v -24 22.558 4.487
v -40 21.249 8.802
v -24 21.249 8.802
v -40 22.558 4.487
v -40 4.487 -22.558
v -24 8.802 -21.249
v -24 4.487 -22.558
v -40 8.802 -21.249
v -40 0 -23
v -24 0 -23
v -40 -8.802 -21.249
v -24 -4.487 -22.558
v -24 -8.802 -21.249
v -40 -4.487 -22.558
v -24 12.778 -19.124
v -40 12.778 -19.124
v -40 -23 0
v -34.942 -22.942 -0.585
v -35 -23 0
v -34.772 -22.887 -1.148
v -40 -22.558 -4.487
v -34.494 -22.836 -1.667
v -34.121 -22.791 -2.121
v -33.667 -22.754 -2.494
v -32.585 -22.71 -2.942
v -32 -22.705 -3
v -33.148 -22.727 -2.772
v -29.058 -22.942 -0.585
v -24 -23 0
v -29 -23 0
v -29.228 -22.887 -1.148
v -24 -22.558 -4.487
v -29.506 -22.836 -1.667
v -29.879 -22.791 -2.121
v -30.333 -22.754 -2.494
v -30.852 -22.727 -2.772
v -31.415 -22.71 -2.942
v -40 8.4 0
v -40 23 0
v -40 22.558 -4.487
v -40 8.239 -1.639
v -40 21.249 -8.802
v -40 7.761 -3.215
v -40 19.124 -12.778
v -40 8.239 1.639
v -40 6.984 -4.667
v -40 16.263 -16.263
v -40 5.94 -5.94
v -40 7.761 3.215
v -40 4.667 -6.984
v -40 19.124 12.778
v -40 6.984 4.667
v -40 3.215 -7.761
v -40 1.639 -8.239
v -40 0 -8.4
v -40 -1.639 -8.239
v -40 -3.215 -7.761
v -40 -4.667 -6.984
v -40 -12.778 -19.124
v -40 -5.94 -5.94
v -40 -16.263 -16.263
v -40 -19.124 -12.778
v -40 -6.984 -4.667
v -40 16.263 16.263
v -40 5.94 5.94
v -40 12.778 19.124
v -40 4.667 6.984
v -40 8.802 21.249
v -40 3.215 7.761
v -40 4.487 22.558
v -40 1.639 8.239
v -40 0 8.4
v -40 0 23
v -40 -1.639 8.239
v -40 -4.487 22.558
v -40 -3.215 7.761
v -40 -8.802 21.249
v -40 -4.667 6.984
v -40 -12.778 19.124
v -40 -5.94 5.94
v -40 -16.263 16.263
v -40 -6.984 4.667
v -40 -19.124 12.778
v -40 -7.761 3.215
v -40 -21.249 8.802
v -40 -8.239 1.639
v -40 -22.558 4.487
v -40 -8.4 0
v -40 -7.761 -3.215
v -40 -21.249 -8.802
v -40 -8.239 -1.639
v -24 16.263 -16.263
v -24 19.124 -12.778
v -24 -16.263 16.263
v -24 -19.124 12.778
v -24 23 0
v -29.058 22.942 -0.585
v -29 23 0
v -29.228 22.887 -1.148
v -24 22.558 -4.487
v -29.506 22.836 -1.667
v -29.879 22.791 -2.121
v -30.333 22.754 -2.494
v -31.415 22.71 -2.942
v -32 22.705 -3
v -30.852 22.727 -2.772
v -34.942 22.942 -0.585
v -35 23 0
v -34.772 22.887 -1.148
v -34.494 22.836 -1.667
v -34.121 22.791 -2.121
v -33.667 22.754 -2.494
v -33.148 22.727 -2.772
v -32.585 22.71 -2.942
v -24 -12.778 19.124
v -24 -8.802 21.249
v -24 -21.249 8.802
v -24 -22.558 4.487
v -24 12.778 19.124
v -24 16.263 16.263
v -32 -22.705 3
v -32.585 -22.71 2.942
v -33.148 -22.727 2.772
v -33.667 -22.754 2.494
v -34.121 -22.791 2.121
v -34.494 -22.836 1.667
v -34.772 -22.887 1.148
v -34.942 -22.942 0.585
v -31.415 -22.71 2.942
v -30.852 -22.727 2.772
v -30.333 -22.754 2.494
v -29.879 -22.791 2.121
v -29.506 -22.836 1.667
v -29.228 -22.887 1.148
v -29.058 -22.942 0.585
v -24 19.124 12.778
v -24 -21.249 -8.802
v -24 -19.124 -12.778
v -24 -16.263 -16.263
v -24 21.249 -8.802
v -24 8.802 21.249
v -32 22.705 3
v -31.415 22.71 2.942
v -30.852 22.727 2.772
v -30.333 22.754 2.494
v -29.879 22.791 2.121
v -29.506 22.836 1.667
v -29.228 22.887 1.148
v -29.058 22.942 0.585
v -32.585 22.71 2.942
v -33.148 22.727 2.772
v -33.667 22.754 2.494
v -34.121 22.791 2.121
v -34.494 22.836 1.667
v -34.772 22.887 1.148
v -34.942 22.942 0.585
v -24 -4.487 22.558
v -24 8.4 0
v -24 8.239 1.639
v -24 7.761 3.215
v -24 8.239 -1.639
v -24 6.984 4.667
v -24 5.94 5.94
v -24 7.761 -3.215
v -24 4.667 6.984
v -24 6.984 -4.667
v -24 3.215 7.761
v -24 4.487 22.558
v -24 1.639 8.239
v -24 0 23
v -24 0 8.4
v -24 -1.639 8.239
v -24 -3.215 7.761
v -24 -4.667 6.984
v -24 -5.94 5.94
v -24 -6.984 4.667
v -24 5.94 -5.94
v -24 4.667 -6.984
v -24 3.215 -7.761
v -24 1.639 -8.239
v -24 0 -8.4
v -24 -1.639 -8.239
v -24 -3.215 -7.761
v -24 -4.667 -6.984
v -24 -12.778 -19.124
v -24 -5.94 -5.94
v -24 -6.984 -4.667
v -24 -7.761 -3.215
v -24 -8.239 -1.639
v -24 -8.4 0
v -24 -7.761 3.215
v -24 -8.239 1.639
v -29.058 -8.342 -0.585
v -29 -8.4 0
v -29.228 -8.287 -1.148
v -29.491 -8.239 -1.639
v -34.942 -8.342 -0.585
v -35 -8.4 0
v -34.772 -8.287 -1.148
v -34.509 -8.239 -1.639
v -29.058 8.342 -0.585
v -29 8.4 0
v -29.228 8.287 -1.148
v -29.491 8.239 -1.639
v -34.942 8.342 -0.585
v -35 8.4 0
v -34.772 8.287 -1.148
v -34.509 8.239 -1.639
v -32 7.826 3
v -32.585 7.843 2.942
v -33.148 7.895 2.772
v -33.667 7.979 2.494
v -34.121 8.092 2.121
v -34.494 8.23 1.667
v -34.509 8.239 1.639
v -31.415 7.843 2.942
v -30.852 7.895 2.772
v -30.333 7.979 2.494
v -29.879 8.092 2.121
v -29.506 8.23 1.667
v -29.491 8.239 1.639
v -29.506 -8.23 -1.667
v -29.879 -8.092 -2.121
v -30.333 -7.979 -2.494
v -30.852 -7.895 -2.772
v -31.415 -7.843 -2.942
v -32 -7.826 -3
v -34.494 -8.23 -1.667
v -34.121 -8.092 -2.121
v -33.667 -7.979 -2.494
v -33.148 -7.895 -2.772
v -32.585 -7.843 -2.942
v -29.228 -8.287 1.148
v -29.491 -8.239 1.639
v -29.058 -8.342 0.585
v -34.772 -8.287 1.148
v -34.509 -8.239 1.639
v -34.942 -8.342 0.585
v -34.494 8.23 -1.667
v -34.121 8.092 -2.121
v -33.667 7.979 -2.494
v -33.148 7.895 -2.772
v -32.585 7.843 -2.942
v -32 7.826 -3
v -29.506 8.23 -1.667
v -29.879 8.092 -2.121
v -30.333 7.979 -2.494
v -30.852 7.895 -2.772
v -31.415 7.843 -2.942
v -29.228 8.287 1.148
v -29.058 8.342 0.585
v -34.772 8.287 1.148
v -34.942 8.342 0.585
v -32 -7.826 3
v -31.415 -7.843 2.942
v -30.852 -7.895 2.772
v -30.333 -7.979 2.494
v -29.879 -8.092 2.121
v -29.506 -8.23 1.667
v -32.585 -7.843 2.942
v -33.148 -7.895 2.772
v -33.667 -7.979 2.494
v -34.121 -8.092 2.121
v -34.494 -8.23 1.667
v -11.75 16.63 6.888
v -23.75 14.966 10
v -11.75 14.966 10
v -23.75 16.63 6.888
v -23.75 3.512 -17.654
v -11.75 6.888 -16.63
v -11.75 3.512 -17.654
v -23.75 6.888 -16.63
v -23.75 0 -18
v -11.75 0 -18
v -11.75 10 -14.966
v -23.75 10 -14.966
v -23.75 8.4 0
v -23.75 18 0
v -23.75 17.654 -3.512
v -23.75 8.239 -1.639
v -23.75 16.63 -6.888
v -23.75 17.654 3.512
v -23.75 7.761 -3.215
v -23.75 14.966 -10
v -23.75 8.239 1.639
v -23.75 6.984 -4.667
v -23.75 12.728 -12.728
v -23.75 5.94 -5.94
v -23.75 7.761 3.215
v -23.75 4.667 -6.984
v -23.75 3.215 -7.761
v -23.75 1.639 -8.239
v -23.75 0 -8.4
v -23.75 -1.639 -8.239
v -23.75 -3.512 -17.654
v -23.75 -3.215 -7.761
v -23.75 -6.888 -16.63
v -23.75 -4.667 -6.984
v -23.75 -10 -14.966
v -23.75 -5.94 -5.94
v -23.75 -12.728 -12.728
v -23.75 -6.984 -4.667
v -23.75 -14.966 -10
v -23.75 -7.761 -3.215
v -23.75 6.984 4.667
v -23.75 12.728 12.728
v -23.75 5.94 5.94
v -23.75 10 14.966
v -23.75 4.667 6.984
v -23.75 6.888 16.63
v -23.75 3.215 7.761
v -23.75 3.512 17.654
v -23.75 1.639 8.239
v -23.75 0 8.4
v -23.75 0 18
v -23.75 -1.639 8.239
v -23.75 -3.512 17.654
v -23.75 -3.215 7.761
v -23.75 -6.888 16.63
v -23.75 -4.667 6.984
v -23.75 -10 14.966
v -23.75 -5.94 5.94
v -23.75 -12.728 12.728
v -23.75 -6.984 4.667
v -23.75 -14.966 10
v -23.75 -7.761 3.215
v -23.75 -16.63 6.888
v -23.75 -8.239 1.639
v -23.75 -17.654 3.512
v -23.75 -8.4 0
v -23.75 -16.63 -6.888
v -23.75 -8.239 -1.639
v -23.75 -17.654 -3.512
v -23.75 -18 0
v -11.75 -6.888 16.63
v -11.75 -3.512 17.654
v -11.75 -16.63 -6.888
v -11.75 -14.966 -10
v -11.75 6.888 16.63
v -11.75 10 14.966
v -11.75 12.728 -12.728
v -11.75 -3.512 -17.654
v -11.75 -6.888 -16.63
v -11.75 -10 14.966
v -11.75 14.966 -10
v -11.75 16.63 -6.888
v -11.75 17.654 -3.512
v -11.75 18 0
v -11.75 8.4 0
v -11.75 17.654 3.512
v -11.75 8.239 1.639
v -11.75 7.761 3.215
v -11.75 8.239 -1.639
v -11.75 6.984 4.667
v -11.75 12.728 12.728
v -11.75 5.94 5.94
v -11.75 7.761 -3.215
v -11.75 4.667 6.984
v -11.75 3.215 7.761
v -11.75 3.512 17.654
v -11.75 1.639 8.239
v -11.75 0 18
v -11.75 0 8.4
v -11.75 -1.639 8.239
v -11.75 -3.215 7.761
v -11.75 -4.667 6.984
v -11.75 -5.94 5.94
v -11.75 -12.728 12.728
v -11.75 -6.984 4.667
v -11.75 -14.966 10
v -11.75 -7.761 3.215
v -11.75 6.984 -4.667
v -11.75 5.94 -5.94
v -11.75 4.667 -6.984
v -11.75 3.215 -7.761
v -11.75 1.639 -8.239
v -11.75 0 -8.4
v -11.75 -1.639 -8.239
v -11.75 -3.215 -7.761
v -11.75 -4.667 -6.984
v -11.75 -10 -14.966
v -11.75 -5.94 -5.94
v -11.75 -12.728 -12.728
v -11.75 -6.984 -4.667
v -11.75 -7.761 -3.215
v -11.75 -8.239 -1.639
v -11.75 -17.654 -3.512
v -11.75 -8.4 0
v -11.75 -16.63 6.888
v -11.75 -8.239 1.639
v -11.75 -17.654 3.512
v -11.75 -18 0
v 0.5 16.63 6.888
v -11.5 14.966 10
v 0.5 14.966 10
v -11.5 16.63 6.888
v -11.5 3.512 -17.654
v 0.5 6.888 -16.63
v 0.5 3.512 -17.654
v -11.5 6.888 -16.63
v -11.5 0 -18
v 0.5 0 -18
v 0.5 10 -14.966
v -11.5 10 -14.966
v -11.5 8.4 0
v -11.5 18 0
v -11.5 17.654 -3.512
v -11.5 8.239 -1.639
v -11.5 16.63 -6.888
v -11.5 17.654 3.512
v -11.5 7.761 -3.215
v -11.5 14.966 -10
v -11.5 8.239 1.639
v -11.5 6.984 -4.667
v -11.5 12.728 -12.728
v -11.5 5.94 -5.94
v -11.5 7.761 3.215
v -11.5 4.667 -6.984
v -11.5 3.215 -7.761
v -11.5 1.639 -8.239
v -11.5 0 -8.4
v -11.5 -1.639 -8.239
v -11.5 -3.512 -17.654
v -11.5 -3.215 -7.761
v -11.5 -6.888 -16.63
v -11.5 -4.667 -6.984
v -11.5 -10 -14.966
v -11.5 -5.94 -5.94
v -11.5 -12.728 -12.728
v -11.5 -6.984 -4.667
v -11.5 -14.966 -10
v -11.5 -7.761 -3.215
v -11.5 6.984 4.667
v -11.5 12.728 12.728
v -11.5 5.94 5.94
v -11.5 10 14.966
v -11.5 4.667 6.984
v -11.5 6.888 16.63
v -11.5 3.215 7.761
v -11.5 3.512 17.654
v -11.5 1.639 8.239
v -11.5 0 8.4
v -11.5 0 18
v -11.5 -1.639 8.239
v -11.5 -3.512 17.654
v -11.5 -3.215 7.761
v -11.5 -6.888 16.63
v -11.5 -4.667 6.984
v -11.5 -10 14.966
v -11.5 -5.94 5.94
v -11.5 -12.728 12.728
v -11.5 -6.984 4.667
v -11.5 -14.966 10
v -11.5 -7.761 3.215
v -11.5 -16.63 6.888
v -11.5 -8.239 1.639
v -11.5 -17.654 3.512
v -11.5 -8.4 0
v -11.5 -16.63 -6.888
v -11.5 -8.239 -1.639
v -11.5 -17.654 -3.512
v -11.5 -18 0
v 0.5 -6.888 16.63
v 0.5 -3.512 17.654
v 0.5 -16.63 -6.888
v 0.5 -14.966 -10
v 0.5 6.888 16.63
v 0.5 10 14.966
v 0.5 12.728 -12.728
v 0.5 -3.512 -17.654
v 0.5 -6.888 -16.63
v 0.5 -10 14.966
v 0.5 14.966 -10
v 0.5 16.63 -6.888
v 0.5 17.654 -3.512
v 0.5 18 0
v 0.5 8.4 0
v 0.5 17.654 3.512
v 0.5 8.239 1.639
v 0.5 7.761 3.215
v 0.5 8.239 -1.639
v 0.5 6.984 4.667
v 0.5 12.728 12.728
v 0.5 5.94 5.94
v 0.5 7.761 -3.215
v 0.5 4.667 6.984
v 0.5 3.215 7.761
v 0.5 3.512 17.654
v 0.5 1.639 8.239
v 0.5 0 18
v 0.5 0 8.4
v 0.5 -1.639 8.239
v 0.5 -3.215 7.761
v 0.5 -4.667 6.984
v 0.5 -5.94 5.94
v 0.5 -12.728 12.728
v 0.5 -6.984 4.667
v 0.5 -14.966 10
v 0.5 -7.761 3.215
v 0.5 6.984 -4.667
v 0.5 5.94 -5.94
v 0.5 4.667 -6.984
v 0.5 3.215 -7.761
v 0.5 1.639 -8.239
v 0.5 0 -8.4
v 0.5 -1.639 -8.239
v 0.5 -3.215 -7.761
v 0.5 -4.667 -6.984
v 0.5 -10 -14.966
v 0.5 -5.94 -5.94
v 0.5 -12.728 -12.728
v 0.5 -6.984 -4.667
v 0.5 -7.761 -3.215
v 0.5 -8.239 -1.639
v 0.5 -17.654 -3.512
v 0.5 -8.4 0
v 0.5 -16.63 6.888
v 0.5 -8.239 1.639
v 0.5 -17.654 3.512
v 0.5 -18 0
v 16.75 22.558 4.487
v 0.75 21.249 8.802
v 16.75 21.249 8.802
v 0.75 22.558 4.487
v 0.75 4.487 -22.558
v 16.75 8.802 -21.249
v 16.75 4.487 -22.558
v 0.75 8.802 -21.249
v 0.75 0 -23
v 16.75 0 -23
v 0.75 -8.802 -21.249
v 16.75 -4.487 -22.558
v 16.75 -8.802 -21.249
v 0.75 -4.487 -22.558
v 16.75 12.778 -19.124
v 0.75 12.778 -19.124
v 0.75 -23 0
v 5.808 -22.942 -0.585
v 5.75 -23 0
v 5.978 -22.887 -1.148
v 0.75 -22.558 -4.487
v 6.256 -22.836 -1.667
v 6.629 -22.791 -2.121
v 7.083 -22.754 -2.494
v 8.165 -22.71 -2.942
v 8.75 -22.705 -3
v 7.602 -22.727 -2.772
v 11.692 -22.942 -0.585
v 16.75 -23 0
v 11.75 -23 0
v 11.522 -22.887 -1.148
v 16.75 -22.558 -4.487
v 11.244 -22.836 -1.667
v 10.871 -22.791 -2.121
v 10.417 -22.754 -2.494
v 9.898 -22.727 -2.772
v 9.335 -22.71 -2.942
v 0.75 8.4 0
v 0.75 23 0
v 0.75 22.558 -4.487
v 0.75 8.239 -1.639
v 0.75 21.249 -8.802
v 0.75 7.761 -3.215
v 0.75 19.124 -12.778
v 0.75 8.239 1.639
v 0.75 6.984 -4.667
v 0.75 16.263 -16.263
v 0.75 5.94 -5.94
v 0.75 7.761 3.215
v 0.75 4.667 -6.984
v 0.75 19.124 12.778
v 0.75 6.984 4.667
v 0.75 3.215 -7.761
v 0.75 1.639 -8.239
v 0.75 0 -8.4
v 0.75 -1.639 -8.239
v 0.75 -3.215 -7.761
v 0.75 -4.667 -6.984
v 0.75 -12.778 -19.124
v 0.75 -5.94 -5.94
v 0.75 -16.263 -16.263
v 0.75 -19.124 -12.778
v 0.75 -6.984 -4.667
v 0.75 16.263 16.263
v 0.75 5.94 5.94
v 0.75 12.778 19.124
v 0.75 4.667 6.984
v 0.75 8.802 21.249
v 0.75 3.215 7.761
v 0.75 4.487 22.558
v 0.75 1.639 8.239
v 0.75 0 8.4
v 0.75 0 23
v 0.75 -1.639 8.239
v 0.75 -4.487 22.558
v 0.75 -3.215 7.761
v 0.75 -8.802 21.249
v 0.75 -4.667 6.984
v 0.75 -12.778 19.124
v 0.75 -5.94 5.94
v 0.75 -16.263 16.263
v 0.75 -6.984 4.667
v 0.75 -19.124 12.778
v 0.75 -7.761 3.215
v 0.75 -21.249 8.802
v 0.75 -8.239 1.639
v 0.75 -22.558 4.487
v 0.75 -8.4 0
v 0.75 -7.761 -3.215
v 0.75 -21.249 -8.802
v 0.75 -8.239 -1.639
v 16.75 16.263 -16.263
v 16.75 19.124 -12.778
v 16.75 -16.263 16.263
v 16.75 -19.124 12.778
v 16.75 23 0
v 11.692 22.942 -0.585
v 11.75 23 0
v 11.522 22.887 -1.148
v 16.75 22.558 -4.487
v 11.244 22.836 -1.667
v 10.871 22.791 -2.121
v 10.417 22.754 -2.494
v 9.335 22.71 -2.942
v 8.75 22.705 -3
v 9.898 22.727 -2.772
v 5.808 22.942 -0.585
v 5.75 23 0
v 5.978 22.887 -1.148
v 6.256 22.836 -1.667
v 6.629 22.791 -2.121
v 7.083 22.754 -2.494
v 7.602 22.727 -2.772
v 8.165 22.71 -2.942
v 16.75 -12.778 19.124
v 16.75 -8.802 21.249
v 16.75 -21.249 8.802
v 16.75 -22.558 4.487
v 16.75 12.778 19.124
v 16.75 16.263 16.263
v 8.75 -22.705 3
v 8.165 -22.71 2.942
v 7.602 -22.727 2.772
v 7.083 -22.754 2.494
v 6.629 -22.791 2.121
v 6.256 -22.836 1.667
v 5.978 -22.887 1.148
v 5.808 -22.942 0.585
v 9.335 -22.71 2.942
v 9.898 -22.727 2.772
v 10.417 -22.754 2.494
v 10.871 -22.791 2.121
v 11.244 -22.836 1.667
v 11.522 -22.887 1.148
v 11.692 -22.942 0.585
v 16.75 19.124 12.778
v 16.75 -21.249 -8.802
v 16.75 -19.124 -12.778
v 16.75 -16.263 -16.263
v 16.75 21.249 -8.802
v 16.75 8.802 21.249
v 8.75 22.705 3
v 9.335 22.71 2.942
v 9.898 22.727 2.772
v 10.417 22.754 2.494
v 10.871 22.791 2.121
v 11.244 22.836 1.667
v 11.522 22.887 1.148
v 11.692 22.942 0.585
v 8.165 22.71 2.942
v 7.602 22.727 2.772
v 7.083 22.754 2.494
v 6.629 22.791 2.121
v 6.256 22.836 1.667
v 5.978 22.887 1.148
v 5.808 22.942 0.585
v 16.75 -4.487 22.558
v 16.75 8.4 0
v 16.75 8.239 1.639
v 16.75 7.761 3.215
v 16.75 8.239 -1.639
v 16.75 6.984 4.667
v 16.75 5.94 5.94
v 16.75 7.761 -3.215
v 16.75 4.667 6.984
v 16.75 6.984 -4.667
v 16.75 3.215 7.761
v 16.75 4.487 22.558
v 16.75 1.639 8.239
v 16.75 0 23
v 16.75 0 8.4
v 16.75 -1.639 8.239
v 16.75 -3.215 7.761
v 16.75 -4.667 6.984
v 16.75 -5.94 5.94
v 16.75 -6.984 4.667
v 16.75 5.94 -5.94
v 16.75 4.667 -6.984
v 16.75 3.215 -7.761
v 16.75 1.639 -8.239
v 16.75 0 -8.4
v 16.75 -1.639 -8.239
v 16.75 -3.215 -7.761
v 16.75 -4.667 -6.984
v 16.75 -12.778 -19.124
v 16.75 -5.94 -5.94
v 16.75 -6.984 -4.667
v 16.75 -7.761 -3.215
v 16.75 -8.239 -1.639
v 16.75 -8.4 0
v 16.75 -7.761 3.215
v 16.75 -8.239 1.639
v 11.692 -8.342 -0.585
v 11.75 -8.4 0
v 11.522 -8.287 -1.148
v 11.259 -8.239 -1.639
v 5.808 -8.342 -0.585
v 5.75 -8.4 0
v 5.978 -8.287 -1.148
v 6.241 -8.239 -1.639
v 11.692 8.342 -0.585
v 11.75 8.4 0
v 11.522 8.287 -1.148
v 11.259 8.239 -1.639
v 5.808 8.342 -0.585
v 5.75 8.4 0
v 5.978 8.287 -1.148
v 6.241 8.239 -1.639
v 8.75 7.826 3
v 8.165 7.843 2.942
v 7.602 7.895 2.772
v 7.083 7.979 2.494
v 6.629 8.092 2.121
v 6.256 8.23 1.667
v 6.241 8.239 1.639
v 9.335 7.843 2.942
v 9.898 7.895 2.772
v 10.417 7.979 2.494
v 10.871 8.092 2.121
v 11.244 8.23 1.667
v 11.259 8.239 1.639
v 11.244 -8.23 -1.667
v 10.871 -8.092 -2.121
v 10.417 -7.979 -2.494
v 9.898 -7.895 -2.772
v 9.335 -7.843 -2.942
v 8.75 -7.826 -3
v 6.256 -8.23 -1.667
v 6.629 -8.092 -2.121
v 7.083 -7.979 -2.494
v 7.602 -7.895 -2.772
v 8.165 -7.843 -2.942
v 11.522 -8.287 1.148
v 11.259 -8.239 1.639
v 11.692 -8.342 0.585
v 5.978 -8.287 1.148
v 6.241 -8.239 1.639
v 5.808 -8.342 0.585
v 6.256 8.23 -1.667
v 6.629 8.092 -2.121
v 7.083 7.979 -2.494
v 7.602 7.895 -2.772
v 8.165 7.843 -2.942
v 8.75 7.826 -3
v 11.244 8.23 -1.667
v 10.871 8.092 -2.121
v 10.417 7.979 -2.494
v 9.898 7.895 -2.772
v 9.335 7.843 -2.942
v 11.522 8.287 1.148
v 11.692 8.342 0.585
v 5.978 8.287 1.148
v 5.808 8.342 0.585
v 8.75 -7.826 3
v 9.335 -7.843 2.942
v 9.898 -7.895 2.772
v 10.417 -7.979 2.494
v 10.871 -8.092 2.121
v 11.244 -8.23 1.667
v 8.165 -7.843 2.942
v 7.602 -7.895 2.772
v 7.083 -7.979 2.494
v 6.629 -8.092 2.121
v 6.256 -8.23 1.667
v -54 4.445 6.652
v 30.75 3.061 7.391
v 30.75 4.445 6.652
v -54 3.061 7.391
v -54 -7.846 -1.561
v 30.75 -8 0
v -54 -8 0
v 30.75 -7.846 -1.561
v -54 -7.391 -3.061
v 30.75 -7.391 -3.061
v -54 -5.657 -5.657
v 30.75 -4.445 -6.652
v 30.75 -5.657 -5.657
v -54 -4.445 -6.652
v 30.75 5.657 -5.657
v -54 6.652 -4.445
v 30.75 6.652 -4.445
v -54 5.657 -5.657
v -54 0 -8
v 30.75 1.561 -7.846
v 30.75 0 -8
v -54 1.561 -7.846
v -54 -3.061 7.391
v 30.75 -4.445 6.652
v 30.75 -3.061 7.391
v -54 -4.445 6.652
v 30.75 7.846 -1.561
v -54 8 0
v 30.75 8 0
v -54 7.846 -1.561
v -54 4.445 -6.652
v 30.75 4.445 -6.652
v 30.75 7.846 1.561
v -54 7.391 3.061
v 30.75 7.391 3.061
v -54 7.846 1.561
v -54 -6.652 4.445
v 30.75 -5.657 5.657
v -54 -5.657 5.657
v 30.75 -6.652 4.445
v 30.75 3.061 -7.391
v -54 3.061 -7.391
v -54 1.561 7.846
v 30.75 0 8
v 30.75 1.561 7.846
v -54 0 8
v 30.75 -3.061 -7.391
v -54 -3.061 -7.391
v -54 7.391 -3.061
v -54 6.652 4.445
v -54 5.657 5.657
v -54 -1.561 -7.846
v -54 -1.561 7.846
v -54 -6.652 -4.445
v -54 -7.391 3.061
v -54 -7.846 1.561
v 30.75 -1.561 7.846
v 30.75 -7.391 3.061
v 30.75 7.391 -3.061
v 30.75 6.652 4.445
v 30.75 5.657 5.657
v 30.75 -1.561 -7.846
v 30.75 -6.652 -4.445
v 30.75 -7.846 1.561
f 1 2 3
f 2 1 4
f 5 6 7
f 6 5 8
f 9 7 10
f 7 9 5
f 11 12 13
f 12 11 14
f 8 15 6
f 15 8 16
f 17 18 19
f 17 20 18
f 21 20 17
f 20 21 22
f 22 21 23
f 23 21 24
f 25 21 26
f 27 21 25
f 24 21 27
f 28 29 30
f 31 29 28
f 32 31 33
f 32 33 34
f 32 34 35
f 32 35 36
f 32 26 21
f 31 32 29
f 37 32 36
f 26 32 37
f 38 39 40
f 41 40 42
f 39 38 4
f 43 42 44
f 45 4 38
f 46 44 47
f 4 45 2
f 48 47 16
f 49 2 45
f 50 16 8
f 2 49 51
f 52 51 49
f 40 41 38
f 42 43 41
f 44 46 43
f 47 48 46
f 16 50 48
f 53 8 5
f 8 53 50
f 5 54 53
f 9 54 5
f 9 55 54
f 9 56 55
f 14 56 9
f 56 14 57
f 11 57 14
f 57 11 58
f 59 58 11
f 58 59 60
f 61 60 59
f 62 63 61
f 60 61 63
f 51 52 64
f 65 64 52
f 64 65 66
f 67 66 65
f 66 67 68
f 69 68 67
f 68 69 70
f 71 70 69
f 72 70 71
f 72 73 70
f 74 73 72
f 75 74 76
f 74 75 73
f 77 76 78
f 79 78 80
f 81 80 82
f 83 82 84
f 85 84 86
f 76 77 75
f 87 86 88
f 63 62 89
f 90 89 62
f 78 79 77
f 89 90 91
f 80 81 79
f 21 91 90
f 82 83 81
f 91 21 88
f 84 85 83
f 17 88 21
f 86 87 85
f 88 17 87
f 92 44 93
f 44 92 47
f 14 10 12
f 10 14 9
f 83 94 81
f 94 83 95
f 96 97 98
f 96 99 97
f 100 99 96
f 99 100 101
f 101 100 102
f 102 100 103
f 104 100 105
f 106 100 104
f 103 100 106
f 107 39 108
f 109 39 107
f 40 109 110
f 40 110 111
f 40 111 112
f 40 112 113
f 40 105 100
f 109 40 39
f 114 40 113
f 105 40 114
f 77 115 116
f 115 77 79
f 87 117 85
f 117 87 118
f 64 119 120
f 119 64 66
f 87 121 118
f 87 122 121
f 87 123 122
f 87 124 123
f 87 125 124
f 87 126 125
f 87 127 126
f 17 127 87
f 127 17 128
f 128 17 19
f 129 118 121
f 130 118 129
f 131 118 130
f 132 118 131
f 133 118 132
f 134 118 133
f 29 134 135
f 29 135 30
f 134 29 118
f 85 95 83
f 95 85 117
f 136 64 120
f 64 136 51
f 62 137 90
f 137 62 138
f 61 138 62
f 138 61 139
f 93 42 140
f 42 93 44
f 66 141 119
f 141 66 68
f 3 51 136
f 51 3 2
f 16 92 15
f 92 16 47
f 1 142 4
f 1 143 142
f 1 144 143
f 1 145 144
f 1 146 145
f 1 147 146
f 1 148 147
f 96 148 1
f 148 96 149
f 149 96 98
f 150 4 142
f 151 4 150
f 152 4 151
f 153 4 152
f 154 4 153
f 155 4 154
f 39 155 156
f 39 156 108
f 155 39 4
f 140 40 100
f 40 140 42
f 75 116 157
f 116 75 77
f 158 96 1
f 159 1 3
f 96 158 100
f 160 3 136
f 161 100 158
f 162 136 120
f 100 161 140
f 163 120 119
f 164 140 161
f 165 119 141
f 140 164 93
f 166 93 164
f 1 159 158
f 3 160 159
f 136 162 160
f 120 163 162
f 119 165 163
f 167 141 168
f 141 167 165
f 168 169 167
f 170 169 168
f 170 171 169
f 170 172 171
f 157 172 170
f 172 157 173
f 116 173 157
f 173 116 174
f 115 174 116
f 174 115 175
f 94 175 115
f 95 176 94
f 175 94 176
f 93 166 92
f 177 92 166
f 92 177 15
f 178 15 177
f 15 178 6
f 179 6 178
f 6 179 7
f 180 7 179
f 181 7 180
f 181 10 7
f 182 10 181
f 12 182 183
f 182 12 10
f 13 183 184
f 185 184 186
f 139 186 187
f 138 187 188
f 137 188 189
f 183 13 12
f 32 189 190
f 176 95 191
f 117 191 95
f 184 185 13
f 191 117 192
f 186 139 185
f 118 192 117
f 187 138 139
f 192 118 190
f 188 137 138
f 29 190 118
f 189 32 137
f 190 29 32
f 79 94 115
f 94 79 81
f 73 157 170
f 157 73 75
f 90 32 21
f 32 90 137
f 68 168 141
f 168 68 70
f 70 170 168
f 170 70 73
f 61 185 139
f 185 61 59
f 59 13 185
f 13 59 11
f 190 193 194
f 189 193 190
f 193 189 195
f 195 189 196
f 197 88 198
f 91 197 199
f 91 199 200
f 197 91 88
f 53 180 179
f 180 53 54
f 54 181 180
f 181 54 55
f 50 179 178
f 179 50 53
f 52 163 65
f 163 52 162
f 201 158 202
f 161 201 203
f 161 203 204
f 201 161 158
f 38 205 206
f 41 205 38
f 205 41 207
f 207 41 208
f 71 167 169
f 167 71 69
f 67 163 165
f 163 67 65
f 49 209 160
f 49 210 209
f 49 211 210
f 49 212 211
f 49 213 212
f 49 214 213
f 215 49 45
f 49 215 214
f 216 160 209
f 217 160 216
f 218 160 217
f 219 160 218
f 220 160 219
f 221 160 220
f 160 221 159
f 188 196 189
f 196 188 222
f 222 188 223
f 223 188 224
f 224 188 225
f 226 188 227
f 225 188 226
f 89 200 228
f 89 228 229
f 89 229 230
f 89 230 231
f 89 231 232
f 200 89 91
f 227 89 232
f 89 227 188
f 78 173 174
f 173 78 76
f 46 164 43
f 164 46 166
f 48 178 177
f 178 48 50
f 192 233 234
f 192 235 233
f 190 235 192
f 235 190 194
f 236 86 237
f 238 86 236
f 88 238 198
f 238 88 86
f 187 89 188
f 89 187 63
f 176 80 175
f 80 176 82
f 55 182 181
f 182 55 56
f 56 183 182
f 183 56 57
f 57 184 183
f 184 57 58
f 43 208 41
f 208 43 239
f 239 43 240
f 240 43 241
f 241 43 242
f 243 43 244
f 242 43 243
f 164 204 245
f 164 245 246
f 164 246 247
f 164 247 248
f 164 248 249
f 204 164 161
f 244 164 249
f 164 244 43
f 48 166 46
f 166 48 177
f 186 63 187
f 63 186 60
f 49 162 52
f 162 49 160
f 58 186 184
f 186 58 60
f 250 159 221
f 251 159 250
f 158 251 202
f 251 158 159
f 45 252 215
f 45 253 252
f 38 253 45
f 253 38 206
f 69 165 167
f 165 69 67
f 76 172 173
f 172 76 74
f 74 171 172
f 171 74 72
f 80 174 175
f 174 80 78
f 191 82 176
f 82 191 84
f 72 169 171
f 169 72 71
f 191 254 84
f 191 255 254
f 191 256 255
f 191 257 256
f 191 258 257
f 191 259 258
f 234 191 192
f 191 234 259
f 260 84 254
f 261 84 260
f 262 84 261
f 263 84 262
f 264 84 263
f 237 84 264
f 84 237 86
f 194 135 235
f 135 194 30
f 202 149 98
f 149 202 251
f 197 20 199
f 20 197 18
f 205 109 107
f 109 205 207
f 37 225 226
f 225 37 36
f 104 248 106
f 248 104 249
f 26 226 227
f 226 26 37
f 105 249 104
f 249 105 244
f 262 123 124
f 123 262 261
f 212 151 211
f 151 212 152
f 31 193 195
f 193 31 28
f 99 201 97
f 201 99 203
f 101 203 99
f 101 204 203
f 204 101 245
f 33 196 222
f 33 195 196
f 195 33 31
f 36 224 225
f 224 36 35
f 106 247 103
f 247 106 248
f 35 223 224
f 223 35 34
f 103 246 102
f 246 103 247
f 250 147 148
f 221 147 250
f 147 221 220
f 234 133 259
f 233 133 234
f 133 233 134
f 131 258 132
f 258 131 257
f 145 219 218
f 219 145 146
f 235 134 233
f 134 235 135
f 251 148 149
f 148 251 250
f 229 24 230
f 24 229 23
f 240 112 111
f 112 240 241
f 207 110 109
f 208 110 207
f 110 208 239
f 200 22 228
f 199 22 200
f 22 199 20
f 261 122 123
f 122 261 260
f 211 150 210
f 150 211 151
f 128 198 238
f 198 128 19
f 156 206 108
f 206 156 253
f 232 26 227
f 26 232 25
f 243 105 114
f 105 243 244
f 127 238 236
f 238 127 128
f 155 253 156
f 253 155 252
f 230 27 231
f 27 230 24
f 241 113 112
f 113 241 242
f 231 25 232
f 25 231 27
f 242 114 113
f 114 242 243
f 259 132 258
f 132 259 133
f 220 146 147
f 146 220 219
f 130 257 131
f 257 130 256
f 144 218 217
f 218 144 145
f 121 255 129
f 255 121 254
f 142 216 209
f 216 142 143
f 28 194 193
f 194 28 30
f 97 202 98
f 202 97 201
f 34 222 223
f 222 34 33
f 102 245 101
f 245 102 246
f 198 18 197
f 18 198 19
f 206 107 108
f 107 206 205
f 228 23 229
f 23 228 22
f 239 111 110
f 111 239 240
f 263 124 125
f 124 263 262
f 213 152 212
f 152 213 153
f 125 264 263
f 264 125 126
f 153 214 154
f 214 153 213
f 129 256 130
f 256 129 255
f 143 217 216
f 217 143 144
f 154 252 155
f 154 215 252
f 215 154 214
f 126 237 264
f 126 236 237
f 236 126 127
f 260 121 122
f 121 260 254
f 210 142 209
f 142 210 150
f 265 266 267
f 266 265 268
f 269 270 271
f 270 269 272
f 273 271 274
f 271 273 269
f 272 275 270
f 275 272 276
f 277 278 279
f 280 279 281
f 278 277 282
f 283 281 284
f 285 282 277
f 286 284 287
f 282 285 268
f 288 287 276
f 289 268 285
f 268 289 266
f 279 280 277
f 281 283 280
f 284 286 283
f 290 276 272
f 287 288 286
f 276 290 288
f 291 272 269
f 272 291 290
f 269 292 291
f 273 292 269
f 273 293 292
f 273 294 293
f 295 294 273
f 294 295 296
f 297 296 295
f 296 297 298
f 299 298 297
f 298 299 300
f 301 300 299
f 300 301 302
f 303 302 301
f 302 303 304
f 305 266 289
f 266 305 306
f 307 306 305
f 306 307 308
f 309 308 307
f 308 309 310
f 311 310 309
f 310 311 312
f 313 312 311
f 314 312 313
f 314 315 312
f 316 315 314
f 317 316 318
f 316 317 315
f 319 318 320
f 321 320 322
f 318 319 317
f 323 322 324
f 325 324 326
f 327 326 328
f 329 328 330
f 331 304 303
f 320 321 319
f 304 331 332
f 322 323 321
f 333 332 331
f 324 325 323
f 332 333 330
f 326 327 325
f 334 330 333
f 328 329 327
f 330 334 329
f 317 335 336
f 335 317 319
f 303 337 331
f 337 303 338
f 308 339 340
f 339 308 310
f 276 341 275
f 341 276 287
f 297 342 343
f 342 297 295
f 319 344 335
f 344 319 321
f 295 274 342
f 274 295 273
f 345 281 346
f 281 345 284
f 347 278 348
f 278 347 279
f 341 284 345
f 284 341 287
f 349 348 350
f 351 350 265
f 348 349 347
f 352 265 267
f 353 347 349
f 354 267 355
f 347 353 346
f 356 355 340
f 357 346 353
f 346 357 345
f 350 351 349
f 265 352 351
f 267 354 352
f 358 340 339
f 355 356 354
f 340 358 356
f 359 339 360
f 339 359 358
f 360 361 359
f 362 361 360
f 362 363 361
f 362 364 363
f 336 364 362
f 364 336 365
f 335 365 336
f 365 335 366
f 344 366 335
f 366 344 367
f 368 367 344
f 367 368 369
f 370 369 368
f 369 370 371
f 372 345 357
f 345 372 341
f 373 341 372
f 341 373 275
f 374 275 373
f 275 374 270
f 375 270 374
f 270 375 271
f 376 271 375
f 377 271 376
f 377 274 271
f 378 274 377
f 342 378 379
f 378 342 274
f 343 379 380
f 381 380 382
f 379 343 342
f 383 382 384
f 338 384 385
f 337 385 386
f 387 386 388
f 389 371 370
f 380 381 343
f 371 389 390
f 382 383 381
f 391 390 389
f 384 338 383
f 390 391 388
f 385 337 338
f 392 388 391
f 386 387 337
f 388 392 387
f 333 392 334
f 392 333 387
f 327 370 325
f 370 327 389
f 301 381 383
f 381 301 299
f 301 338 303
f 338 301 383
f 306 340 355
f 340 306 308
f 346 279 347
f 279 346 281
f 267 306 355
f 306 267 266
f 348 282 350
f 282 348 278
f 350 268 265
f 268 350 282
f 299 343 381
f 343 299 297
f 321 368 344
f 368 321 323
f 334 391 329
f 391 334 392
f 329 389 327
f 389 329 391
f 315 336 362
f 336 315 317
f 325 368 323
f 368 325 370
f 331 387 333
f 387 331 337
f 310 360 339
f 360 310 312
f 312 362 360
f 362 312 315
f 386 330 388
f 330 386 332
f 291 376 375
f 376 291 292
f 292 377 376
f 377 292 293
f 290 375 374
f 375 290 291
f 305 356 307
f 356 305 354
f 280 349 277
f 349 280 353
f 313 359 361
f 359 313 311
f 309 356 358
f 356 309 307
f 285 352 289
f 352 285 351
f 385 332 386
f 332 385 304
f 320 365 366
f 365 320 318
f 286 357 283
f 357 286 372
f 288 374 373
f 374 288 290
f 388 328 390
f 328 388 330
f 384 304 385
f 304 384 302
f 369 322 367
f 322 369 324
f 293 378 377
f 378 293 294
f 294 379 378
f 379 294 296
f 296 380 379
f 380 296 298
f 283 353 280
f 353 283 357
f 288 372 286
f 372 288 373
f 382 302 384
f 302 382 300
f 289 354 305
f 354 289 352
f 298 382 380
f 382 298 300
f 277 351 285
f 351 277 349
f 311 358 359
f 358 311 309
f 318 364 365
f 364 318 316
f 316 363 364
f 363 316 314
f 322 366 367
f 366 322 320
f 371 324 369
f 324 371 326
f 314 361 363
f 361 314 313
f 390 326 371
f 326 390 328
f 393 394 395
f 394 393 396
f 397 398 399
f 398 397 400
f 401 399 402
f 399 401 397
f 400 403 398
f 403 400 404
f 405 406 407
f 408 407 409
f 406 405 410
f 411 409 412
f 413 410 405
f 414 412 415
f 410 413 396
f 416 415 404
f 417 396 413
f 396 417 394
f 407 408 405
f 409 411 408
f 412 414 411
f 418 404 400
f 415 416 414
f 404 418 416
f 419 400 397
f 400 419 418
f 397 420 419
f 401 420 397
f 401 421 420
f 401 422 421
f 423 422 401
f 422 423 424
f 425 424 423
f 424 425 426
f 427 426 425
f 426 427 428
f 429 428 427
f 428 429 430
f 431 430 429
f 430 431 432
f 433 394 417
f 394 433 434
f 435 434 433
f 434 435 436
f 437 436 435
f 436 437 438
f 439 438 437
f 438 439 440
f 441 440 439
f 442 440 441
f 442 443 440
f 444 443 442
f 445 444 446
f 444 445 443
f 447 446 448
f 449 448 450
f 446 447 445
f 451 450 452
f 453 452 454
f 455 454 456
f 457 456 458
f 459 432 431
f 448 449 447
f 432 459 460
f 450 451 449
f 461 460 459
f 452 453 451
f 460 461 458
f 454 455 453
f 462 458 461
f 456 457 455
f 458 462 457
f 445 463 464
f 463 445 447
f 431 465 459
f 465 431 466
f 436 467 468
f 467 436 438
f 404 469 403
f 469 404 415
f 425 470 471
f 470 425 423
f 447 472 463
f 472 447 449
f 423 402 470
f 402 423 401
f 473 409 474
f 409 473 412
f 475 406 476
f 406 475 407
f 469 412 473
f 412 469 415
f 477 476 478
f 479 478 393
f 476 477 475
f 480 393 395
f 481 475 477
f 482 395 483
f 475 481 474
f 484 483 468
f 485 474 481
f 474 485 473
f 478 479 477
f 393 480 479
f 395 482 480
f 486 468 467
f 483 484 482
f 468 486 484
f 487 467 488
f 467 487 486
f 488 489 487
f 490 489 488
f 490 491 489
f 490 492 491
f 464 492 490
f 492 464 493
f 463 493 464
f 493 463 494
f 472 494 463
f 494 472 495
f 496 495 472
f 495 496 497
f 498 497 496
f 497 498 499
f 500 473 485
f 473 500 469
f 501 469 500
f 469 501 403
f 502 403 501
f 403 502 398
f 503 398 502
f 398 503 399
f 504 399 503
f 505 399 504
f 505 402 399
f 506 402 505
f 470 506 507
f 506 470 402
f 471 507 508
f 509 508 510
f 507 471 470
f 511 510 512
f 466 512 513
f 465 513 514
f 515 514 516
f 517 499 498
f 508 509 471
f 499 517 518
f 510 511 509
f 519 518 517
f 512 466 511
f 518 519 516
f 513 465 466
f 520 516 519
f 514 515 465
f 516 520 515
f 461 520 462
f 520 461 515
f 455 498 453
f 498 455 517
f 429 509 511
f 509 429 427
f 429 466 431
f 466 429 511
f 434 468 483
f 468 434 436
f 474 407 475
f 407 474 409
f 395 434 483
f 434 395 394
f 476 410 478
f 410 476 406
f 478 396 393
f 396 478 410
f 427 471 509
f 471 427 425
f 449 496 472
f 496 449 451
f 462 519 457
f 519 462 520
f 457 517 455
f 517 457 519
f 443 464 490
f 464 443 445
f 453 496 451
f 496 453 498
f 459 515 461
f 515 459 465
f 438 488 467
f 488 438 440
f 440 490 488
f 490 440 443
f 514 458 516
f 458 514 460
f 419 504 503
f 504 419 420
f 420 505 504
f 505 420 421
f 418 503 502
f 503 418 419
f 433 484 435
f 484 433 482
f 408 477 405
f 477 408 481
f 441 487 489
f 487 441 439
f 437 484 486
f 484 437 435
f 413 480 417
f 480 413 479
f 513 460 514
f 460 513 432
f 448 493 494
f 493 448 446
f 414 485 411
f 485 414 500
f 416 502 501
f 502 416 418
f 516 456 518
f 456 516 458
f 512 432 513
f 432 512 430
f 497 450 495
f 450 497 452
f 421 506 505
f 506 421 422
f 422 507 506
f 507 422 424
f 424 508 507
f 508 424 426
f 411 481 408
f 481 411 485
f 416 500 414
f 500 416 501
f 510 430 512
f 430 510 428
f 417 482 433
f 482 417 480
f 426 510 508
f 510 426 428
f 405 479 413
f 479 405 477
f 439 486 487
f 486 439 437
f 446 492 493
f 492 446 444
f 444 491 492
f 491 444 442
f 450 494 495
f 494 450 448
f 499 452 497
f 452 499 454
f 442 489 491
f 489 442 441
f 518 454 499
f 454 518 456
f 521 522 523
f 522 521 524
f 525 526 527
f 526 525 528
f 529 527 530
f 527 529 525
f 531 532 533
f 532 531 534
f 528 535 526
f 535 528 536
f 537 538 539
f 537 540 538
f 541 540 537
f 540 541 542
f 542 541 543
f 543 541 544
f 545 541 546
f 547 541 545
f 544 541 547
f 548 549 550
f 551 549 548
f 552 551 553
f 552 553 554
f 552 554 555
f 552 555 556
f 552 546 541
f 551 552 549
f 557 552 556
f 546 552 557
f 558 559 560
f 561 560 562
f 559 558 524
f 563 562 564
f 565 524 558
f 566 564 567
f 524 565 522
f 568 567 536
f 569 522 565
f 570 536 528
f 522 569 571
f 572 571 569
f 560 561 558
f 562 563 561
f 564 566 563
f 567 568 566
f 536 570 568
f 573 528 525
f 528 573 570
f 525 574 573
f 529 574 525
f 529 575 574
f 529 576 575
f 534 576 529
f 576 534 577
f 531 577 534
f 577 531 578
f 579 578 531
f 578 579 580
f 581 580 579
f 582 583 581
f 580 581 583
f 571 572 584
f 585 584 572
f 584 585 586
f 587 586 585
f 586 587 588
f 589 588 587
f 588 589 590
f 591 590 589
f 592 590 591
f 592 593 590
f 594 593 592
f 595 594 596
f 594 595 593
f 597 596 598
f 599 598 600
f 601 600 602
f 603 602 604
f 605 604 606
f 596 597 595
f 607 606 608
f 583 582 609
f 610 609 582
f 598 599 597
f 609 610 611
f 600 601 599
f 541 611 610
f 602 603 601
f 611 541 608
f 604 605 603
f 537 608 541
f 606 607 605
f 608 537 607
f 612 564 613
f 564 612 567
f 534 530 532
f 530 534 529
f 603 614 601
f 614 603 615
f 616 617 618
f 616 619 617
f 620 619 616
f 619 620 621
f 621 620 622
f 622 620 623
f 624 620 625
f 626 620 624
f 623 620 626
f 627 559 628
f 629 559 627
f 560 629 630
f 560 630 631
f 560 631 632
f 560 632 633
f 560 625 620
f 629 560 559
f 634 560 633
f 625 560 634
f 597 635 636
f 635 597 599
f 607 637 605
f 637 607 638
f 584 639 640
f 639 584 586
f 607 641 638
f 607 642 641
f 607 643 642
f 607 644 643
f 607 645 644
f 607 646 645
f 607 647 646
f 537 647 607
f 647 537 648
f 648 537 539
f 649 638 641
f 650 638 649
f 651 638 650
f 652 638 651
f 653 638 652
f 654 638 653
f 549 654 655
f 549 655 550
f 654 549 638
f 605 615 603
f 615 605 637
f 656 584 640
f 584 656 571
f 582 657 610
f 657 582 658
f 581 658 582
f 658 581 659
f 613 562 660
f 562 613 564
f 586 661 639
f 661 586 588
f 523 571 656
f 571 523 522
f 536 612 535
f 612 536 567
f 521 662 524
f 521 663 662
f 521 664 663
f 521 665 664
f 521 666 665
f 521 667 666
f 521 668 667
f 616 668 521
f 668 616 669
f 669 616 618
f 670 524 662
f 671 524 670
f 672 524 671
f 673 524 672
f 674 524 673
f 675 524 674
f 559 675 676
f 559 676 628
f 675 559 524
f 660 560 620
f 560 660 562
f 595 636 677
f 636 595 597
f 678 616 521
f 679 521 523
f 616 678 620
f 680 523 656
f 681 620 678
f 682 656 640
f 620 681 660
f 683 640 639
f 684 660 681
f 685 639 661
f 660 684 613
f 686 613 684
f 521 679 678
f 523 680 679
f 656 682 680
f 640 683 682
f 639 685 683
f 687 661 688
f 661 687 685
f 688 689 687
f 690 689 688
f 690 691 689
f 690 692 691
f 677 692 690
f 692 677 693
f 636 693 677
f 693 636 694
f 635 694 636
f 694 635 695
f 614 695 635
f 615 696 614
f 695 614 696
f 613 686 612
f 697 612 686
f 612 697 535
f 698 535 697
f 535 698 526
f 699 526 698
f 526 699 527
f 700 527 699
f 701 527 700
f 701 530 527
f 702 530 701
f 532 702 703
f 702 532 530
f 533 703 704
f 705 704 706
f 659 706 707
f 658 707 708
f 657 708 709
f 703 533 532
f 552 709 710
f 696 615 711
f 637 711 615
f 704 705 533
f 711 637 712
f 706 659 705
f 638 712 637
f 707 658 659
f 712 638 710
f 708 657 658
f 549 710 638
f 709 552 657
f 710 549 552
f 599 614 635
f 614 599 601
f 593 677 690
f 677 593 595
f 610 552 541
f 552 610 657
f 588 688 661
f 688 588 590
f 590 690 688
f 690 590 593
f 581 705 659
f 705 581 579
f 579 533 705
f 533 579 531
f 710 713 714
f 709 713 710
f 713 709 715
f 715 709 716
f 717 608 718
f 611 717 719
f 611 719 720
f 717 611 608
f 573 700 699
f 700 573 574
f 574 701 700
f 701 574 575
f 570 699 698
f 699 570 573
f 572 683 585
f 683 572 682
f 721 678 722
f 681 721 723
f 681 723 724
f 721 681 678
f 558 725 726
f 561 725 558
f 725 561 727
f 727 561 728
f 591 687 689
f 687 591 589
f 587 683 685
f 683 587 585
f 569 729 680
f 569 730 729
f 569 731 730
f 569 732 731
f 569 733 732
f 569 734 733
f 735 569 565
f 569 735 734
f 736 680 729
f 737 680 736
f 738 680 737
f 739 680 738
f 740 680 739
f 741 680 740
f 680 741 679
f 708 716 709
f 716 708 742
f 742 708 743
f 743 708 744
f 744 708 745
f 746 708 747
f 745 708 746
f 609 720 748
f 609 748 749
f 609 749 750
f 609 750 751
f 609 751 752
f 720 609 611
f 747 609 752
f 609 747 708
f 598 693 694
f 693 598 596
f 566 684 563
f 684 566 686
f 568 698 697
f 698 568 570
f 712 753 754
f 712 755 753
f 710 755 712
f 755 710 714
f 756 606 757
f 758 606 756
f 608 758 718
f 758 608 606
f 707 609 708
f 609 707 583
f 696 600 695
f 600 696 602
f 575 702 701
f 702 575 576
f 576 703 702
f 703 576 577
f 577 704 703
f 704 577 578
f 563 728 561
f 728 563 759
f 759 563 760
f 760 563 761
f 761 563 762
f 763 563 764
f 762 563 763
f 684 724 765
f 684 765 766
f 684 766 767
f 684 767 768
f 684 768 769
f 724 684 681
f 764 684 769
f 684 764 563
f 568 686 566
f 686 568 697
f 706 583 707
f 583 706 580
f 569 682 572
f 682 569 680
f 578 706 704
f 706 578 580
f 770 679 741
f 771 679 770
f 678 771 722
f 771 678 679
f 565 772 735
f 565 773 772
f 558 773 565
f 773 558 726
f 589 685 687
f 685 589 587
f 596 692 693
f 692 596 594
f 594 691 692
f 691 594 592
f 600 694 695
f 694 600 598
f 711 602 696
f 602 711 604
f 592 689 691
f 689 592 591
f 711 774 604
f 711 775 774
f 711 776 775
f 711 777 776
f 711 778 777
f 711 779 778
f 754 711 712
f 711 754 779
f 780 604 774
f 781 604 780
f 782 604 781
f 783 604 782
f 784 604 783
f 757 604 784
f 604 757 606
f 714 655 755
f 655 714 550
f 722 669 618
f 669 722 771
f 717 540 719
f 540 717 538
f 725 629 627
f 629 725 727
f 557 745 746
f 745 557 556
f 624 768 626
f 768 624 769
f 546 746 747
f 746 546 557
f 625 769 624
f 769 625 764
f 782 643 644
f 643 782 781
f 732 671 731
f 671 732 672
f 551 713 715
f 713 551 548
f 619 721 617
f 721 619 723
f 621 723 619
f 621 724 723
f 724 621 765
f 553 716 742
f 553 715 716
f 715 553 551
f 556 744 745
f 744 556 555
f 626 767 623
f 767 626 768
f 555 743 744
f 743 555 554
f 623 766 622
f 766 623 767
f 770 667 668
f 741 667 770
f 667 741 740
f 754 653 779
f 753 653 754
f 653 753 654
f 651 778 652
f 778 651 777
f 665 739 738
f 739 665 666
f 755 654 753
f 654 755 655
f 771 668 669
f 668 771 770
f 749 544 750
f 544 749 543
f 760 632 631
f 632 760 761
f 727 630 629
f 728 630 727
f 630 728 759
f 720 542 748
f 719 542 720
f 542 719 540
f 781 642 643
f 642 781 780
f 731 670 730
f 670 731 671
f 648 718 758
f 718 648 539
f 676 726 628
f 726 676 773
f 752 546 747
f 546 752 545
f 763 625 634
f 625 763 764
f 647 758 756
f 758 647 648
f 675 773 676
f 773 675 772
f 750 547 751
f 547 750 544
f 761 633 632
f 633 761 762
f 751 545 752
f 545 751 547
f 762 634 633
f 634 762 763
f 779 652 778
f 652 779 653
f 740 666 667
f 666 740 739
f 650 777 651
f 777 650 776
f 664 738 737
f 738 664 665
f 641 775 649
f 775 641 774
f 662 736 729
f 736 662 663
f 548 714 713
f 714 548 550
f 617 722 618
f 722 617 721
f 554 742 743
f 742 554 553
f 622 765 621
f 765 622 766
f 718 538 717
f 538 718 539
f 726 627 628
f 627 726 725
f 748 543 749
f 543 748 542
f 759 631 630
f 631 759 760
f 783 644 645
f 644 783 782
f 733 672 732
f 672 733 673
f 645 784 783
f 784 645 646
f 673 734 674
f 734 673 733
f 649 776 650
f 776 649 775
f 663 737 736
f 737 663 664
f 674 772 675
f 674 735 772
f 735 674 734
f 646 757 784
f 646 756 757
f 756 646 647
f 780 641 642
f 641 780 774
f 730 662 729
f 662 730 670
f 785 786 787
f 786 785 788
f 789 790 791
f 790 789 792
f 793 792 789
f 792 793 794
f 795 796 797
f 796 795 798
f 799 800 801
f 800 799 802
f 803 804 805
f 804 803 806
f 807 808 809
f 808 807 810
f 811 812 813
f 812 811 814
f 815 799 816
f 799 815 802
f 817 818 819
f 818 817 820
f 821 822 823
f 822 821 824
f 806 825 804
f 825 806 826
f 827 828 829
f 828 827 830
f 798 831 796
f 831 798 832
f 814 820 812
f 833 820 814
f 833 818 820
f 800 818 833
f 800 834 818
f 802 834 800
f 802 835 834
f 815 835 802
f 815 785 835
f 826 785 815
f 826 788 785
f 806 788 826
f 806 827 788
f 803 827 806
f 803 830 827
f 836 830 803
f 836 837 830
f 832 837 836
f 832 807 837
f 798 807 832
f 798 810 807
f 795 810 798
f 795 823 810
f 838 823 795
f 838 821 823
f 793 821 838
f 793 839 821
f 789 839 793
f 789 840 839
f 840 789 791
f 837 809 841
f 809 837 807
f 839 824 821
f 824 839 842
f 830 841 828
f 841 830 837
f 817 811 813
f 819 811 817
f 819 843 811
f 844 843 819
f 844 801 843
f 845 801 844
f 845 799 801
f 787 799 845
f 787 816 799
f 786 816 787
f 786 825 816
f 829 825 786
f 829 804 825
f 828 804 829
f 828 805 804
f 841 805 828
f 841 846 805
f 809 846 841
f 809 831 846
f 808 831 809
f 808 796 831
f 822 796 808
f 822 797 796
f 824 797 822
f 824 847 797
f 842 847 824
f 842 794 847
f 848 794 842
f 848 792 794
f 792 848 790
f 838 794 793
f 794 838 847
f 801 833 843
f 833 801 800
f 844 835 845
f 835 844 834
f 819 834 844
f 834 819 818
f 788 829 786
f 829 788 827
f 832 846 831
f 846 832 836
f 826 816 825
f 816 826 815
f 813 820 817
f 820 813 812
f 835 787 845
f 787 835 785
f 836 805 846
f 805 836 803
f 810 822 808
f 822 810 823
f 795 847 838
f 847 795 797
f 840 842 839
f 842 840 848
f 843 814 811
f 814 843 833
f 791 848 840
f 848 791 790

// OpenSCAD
$fn = 32;

// ------------------------------------------------------------------------
// Shaft with rings and collars: d16 shaft, 4 rings
// Every part is its own module, assembly() places them once.
// ------------------------------------------------------------------------

// --- part 1 ---
module shaft() {
  translate([0, 0, -42.375]) cylinder(h = 84.75, d = 16);
}

// --- part 2 ---
module collar_a() {
  difference() {
    cylinder(h = 16, d = 46);
    translate([0, 0, -1]) cylinder(h = 18, d = 16.8);
    translate([0, 0, 8]) rotate([90, 0, 0]) cylinder(h = 48, d = 6, center = true);
  }
}

// --- part 3 ---
module spacer_a() {
  difference() {
      translate([0, 0, 0]) cylinder(h = 12, d = 36);
      translate([0, 0, -1]) cylinder(h = 14, d = 16.8);
    }
}

// --- part 4 ---
module spacer_b() {
  difference() {
      translate([0, 0, 0]) cylinder(h = 12, d = 36);
      translate([0, 0, -1]) cylinder(h = 14, d = 16.8);
    }
}

// --- part 5 ---
module collar_b() {
  difference() {
    cylinder(h = 16, d = 46);
    translate([0, 0, -1]) cylinder(h = 18, d = 16.8);
    translate([0, 0, 8]) rotate([90, 0, 0]) cylinder(h = 48, d = 6, center = true);
  }
}

// --- assembly ---
module assembly() {
  translate([-11.625, 0, 0]) rotate([0, 90, 0]) shaft();
  translate([-40, 0, 0]) rotate([0, 90, 0]) collar_a();
  translate([-23.75, 0, 0]) rotate([0, 90, 0]) spacer_a();
  translate([-11.5, 0, 0]) rotate([0, 90, 0]) spacer_b();
  translate([0.75, 0, 0]) rotate([0, 90, 0]) collar_b();
}

assembly();
